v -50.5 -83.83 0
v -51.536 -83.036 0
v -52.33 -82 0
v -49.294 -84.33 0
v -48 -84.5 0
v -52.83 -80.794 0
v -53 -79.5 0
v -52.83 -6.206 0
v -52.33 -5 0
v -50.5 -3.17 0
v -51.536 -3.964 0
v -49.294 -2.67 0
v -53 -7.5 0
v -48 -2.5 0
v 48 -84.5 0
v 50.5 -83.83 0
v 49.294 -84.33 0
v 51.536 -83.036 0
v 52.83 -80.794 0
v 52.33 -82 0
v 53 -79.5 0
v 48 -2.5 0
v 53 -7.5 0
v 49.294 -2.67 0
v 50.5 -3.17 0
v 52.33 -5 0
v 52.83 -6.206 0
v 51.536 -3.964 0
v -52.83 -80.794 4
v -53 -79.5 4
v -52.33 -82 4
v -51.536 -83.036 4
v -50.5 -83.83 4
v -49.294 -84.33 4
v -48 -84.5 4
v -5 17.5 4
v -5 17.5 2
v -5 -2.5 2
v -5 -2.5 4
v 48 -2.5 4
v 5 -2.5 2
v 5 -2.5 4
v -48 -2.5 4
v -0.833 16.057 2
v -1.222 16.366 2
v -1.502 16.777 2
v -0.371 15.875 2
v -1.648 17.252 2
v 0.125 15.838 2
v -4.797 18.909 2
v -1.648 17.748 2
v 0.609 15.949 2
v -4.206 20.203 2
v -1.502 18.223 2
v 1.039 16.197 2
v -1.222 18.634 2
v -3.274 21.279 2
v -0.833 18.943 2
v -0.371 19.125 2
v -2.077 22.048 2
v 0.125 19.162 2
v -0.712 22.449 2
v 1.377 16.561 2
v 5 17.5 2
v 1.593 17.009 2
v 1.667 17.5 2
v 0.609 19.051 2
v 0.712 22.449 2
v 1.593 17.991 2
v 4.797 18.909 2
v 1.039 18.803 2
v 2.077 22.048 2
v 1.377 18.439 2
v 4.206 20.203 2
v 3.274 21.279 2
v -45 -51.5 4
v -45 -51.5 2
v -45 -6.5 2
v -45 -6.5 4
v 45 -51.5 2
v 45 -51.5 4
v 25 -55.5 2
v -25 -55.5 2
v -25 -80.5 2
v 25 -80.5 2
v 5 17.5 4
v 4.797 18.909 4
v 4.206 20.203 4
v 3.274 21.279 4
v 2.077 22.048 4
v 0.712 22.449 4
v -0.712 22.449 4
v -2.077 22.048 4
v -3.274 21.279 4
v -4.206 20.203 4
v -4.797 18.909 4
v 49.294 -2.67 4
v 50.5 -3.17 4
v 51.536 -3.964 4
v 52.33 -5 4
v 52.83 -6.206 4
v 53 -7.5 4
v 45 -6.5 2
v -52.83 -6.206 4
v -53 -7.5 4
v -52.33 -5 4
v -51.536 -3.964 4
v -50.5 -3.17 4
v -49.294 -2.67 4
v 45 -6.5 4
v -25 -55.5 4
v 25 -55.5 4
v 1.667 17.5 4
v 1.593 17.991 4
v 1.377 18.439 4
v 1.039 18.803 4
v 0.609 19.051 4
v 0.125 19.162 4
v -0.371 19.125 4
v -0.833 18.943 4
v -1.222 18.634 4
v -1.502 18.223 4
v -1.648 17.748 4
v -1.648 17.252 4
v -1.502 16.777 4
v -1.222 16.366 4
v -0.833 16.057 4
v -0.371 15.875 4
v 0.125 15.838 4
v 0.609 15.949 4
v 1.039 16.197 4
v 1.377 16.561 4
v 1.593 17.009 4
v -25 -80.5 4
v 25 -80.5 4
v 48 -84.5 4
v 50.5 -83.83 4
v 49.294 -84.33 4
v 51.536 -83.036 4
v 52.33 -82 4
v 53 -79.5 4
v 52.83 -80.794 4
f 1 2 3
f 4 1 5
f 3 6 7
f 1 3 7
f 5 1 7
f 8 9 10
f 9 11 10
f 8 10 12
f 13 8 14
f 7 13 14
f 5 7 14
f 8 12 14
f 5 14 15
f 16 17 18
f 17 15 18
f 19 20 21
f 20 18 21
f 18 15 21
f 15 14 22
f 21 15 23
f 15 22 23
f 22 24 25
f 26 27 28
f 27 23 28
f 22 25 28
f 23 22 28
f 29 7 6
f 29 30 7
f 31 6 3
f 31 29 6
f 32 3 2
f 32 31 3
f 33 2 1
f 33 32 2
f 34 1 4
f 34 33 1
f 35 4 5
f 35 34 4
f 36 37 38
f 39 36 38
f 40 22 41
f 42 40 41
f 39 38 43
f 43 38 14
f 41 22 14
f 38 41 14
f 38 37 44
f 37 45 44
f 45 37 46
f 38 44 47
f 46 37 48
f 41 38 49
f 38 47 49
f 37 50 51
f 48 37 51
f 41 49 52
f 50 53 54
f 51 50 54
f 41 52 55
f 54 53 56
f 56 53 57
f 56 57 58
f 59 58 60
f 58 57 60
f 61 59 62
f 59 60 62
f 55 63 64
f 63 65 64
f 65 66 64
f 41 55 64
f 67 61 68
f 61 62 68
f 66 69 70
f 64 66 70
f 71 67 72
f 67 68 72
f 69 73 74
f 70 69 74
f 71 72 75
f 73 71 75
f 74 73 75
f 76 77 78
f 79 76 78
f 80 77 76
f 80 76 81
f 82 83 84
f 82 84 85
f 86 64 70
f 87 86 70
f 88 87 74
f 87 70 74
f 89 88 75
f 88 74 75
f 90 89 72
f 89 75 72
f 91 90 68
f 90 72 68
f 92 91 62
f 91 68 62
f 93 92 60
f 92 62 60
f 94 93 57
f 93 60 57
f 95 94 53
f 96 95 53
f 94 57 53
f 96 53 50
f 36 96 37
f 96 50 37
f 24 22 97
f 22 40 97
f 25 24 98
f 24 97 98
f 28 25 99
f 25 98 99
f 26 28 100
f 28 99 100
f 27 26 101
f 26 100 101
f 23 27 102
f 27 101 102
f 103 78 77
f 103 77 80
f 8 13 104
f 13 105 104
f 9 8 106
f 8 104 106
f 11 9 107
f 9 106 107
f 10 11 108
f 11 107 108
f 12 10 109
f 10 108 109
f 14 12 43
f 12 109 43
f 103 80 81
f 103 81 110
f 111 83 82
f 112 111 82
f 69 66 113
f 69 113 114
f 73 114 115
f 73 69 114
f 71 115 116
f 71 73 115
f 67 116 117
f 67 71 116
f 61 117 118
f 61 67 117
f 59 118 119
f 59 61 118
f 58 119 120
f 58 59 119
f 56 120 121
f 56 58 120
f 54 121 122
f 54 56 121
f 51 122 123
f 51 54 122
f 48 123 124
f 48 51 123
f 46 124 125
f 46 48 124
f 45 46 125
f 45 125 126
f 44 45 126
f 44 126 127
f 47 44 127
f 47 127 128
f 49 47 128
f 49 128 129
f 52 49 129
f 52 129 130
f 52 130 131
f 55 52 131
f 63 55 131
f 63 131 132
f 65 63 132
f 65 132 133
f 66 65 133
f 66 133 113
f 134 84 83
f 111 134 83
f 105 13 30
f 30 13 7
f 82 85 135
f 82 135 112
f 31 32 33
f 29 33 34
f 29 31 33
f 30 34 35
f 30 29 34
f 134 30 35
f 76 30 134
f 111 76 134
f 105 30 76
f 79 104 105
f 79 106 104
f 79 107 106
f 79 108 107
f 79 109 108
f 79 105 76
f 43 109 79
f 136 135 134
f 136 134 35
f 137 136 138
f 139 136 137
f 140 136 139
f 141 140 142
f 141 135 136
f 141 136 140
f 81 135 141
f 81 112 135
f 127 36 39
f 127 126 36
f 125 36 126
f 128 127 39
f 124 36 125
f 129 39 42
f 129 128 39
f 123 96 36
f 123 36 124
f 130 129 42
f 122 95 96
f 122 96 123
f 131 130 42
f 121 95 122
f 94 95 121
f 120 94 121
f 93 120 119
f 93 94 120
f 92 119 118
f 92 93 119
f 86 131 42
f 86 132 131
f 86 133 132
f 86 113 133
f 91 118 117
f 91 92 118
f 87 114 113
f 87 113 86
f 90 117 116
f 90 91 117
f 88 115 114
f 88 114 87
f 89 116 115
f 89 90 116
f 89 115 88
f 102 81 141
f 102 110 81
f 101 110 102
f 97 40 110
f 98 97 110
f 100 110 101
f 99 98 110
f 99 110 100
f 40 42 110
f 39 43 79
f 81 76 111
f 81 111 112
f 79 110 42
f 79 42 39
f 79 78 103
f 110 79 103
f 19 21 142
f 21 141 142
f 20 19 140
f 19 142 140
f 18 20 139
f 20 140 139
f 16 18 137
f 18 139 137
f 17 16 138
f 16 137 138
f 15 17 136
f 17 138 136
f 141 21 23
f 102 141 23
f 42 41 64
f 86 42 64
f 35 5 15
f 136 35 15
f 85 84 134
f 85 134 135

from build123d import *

# Parameters (mm, degrees)
F0_W     = 50
F0_H     = 25
F0_W_2   = 90
F0_H_2   = 45
F1_DEPTH = 4
F2_DEPTH = 2
F5_DEPTH = 2.001
F7_R     = 5
F0_R     = 1.6666666667
F8_DEPTH = 4
F9_DEPTH = 2


# Not quite as in the source:
# - a feature names something its author has since deleted; it is built from what else it names


with BuildPart() as f1:
    # F0 (on Top) → F1 (new body)
    with BuildSketch(Plane.XY):
        Polygon((-53, -84.5), (53, -84.5), (53, -2.5), (5, -2.5), (-5, -2.5), (-53, -2.5), align=None)
        with Locations((0, -68)):
            Rectangle(F0_W, F0_H, mode=Mode.SUBTRACT)
        with Locations((0, -29)):
            Rectangle(F0_W_2, F0_H_2, mode=Mode.SUBTRACT)
    extrude(amount=F1_DEPTH)

    # F0 (on Top) → F2 (join)
    with BuildSketch(Plane.XY):
        with Locations((0, -68)):
            Rectangle(F0_W, F0_H)
        with Locations((0, -29)):
            Rectangle(F0_W_2, F0_H_2)
    extrude(amount=F2_DEPTH)

    # F4 (on offset) → F5 (cut, through all)
    with BuildSketch(Plane.XY.offset(2)):
        with BuildLine():
            Line((-4.1848091993, 17.7334633669), (-4.1848091993, 13.1759698881))
            ThreePointArc((-4.1848091993, 13.1759698881), (-0.249754072, 9.1237647174), (5, 11.2082569299))
            Line((5, 11.2082569299), (5, 17.5))
            ThreePointArc((5, 17.5), (3.3860967443, 17.9195789218), (1.7383729014, 18.1759698881))
            Line((1.7383729014, 18.1759698881), (-1.7383729014, 18.1759698881))
            ThreePointArc((-1.7383729014, 18.1759698881), (-2.9698441971, 18.0003448764), (-4.1848091993, 17.7334633669))
        make_face()
        with BuildLine():
            ThreePointArc((5, 11.2082569299), (-0.249754072, 9.1237647174), (-4.1848091993, 13.1759698881))
            Line((-4.1848091993, 13.1759698881), (-4.1848091993, 17.7334633669))
            ThreePointArc((-4.1848091993, 17.7334633669), (-12.2142757372, 12.9486427976), (-16.4107558429, 4.5966133744))
            Line((-16.4107558429, 4.5966133744), (-5, -2.5))
            Line((-5, -2.5), (5, -2.5))
            Line((5, -2.5), (5, 11.2082569299))
        make_face()
    extrude(amount=-F5_DEPTH, mode=Mode.SUBTRACT)

    # F7
    f7_edges = [f1.edges().sort_by_distance(p)[0] for p in [
        (53, -84.5, 2),
        (-53, -84.5, 2),
        (-53, -2.5, 2),
        (53, -2.5, 2),
    ]]
    fillet(f7_edges, radius=F7_R)

    # F0 (on Top) → F8 (join)
    with BuildSketch(Plane.XY):
        with BuildLine():
            Line((-5, -2.5), (5, -2.5))
            Line((5, -2.5), (5, 17.5))
            ThreePointArc((5, 17.5), (0, 22.5), (-5, 17.5))
            Line((-5, 17.5), (-5, -2.5))
        make_face()
        with Locations((0, 17.5)):
            Circle(F0_R, mode=Mode.SUBTRACT)
    extrude(amount=F8_DEPTH)

    # F0 (on Top) → F9 (cut)
    with BuildSketch(Plane.XY):
        with BuildLine():
            Line((-5, -2.5), (5, -2.5))
            Line((5, -2.5), (5, 17.5))
            ThreePointArc((5, 17.5), (0, 22.5), (-5, 17.5))
            Line((-5, 17.5), (-5, -2.5))
        make_face()
        with Locations((0, 17.5)):
            Circle(F0_R, mode=Mode.SUBTRACT)
    extrude(amount=F9_DEPTH, mode=Mode.SUBTRACT)


solid = f1.part
